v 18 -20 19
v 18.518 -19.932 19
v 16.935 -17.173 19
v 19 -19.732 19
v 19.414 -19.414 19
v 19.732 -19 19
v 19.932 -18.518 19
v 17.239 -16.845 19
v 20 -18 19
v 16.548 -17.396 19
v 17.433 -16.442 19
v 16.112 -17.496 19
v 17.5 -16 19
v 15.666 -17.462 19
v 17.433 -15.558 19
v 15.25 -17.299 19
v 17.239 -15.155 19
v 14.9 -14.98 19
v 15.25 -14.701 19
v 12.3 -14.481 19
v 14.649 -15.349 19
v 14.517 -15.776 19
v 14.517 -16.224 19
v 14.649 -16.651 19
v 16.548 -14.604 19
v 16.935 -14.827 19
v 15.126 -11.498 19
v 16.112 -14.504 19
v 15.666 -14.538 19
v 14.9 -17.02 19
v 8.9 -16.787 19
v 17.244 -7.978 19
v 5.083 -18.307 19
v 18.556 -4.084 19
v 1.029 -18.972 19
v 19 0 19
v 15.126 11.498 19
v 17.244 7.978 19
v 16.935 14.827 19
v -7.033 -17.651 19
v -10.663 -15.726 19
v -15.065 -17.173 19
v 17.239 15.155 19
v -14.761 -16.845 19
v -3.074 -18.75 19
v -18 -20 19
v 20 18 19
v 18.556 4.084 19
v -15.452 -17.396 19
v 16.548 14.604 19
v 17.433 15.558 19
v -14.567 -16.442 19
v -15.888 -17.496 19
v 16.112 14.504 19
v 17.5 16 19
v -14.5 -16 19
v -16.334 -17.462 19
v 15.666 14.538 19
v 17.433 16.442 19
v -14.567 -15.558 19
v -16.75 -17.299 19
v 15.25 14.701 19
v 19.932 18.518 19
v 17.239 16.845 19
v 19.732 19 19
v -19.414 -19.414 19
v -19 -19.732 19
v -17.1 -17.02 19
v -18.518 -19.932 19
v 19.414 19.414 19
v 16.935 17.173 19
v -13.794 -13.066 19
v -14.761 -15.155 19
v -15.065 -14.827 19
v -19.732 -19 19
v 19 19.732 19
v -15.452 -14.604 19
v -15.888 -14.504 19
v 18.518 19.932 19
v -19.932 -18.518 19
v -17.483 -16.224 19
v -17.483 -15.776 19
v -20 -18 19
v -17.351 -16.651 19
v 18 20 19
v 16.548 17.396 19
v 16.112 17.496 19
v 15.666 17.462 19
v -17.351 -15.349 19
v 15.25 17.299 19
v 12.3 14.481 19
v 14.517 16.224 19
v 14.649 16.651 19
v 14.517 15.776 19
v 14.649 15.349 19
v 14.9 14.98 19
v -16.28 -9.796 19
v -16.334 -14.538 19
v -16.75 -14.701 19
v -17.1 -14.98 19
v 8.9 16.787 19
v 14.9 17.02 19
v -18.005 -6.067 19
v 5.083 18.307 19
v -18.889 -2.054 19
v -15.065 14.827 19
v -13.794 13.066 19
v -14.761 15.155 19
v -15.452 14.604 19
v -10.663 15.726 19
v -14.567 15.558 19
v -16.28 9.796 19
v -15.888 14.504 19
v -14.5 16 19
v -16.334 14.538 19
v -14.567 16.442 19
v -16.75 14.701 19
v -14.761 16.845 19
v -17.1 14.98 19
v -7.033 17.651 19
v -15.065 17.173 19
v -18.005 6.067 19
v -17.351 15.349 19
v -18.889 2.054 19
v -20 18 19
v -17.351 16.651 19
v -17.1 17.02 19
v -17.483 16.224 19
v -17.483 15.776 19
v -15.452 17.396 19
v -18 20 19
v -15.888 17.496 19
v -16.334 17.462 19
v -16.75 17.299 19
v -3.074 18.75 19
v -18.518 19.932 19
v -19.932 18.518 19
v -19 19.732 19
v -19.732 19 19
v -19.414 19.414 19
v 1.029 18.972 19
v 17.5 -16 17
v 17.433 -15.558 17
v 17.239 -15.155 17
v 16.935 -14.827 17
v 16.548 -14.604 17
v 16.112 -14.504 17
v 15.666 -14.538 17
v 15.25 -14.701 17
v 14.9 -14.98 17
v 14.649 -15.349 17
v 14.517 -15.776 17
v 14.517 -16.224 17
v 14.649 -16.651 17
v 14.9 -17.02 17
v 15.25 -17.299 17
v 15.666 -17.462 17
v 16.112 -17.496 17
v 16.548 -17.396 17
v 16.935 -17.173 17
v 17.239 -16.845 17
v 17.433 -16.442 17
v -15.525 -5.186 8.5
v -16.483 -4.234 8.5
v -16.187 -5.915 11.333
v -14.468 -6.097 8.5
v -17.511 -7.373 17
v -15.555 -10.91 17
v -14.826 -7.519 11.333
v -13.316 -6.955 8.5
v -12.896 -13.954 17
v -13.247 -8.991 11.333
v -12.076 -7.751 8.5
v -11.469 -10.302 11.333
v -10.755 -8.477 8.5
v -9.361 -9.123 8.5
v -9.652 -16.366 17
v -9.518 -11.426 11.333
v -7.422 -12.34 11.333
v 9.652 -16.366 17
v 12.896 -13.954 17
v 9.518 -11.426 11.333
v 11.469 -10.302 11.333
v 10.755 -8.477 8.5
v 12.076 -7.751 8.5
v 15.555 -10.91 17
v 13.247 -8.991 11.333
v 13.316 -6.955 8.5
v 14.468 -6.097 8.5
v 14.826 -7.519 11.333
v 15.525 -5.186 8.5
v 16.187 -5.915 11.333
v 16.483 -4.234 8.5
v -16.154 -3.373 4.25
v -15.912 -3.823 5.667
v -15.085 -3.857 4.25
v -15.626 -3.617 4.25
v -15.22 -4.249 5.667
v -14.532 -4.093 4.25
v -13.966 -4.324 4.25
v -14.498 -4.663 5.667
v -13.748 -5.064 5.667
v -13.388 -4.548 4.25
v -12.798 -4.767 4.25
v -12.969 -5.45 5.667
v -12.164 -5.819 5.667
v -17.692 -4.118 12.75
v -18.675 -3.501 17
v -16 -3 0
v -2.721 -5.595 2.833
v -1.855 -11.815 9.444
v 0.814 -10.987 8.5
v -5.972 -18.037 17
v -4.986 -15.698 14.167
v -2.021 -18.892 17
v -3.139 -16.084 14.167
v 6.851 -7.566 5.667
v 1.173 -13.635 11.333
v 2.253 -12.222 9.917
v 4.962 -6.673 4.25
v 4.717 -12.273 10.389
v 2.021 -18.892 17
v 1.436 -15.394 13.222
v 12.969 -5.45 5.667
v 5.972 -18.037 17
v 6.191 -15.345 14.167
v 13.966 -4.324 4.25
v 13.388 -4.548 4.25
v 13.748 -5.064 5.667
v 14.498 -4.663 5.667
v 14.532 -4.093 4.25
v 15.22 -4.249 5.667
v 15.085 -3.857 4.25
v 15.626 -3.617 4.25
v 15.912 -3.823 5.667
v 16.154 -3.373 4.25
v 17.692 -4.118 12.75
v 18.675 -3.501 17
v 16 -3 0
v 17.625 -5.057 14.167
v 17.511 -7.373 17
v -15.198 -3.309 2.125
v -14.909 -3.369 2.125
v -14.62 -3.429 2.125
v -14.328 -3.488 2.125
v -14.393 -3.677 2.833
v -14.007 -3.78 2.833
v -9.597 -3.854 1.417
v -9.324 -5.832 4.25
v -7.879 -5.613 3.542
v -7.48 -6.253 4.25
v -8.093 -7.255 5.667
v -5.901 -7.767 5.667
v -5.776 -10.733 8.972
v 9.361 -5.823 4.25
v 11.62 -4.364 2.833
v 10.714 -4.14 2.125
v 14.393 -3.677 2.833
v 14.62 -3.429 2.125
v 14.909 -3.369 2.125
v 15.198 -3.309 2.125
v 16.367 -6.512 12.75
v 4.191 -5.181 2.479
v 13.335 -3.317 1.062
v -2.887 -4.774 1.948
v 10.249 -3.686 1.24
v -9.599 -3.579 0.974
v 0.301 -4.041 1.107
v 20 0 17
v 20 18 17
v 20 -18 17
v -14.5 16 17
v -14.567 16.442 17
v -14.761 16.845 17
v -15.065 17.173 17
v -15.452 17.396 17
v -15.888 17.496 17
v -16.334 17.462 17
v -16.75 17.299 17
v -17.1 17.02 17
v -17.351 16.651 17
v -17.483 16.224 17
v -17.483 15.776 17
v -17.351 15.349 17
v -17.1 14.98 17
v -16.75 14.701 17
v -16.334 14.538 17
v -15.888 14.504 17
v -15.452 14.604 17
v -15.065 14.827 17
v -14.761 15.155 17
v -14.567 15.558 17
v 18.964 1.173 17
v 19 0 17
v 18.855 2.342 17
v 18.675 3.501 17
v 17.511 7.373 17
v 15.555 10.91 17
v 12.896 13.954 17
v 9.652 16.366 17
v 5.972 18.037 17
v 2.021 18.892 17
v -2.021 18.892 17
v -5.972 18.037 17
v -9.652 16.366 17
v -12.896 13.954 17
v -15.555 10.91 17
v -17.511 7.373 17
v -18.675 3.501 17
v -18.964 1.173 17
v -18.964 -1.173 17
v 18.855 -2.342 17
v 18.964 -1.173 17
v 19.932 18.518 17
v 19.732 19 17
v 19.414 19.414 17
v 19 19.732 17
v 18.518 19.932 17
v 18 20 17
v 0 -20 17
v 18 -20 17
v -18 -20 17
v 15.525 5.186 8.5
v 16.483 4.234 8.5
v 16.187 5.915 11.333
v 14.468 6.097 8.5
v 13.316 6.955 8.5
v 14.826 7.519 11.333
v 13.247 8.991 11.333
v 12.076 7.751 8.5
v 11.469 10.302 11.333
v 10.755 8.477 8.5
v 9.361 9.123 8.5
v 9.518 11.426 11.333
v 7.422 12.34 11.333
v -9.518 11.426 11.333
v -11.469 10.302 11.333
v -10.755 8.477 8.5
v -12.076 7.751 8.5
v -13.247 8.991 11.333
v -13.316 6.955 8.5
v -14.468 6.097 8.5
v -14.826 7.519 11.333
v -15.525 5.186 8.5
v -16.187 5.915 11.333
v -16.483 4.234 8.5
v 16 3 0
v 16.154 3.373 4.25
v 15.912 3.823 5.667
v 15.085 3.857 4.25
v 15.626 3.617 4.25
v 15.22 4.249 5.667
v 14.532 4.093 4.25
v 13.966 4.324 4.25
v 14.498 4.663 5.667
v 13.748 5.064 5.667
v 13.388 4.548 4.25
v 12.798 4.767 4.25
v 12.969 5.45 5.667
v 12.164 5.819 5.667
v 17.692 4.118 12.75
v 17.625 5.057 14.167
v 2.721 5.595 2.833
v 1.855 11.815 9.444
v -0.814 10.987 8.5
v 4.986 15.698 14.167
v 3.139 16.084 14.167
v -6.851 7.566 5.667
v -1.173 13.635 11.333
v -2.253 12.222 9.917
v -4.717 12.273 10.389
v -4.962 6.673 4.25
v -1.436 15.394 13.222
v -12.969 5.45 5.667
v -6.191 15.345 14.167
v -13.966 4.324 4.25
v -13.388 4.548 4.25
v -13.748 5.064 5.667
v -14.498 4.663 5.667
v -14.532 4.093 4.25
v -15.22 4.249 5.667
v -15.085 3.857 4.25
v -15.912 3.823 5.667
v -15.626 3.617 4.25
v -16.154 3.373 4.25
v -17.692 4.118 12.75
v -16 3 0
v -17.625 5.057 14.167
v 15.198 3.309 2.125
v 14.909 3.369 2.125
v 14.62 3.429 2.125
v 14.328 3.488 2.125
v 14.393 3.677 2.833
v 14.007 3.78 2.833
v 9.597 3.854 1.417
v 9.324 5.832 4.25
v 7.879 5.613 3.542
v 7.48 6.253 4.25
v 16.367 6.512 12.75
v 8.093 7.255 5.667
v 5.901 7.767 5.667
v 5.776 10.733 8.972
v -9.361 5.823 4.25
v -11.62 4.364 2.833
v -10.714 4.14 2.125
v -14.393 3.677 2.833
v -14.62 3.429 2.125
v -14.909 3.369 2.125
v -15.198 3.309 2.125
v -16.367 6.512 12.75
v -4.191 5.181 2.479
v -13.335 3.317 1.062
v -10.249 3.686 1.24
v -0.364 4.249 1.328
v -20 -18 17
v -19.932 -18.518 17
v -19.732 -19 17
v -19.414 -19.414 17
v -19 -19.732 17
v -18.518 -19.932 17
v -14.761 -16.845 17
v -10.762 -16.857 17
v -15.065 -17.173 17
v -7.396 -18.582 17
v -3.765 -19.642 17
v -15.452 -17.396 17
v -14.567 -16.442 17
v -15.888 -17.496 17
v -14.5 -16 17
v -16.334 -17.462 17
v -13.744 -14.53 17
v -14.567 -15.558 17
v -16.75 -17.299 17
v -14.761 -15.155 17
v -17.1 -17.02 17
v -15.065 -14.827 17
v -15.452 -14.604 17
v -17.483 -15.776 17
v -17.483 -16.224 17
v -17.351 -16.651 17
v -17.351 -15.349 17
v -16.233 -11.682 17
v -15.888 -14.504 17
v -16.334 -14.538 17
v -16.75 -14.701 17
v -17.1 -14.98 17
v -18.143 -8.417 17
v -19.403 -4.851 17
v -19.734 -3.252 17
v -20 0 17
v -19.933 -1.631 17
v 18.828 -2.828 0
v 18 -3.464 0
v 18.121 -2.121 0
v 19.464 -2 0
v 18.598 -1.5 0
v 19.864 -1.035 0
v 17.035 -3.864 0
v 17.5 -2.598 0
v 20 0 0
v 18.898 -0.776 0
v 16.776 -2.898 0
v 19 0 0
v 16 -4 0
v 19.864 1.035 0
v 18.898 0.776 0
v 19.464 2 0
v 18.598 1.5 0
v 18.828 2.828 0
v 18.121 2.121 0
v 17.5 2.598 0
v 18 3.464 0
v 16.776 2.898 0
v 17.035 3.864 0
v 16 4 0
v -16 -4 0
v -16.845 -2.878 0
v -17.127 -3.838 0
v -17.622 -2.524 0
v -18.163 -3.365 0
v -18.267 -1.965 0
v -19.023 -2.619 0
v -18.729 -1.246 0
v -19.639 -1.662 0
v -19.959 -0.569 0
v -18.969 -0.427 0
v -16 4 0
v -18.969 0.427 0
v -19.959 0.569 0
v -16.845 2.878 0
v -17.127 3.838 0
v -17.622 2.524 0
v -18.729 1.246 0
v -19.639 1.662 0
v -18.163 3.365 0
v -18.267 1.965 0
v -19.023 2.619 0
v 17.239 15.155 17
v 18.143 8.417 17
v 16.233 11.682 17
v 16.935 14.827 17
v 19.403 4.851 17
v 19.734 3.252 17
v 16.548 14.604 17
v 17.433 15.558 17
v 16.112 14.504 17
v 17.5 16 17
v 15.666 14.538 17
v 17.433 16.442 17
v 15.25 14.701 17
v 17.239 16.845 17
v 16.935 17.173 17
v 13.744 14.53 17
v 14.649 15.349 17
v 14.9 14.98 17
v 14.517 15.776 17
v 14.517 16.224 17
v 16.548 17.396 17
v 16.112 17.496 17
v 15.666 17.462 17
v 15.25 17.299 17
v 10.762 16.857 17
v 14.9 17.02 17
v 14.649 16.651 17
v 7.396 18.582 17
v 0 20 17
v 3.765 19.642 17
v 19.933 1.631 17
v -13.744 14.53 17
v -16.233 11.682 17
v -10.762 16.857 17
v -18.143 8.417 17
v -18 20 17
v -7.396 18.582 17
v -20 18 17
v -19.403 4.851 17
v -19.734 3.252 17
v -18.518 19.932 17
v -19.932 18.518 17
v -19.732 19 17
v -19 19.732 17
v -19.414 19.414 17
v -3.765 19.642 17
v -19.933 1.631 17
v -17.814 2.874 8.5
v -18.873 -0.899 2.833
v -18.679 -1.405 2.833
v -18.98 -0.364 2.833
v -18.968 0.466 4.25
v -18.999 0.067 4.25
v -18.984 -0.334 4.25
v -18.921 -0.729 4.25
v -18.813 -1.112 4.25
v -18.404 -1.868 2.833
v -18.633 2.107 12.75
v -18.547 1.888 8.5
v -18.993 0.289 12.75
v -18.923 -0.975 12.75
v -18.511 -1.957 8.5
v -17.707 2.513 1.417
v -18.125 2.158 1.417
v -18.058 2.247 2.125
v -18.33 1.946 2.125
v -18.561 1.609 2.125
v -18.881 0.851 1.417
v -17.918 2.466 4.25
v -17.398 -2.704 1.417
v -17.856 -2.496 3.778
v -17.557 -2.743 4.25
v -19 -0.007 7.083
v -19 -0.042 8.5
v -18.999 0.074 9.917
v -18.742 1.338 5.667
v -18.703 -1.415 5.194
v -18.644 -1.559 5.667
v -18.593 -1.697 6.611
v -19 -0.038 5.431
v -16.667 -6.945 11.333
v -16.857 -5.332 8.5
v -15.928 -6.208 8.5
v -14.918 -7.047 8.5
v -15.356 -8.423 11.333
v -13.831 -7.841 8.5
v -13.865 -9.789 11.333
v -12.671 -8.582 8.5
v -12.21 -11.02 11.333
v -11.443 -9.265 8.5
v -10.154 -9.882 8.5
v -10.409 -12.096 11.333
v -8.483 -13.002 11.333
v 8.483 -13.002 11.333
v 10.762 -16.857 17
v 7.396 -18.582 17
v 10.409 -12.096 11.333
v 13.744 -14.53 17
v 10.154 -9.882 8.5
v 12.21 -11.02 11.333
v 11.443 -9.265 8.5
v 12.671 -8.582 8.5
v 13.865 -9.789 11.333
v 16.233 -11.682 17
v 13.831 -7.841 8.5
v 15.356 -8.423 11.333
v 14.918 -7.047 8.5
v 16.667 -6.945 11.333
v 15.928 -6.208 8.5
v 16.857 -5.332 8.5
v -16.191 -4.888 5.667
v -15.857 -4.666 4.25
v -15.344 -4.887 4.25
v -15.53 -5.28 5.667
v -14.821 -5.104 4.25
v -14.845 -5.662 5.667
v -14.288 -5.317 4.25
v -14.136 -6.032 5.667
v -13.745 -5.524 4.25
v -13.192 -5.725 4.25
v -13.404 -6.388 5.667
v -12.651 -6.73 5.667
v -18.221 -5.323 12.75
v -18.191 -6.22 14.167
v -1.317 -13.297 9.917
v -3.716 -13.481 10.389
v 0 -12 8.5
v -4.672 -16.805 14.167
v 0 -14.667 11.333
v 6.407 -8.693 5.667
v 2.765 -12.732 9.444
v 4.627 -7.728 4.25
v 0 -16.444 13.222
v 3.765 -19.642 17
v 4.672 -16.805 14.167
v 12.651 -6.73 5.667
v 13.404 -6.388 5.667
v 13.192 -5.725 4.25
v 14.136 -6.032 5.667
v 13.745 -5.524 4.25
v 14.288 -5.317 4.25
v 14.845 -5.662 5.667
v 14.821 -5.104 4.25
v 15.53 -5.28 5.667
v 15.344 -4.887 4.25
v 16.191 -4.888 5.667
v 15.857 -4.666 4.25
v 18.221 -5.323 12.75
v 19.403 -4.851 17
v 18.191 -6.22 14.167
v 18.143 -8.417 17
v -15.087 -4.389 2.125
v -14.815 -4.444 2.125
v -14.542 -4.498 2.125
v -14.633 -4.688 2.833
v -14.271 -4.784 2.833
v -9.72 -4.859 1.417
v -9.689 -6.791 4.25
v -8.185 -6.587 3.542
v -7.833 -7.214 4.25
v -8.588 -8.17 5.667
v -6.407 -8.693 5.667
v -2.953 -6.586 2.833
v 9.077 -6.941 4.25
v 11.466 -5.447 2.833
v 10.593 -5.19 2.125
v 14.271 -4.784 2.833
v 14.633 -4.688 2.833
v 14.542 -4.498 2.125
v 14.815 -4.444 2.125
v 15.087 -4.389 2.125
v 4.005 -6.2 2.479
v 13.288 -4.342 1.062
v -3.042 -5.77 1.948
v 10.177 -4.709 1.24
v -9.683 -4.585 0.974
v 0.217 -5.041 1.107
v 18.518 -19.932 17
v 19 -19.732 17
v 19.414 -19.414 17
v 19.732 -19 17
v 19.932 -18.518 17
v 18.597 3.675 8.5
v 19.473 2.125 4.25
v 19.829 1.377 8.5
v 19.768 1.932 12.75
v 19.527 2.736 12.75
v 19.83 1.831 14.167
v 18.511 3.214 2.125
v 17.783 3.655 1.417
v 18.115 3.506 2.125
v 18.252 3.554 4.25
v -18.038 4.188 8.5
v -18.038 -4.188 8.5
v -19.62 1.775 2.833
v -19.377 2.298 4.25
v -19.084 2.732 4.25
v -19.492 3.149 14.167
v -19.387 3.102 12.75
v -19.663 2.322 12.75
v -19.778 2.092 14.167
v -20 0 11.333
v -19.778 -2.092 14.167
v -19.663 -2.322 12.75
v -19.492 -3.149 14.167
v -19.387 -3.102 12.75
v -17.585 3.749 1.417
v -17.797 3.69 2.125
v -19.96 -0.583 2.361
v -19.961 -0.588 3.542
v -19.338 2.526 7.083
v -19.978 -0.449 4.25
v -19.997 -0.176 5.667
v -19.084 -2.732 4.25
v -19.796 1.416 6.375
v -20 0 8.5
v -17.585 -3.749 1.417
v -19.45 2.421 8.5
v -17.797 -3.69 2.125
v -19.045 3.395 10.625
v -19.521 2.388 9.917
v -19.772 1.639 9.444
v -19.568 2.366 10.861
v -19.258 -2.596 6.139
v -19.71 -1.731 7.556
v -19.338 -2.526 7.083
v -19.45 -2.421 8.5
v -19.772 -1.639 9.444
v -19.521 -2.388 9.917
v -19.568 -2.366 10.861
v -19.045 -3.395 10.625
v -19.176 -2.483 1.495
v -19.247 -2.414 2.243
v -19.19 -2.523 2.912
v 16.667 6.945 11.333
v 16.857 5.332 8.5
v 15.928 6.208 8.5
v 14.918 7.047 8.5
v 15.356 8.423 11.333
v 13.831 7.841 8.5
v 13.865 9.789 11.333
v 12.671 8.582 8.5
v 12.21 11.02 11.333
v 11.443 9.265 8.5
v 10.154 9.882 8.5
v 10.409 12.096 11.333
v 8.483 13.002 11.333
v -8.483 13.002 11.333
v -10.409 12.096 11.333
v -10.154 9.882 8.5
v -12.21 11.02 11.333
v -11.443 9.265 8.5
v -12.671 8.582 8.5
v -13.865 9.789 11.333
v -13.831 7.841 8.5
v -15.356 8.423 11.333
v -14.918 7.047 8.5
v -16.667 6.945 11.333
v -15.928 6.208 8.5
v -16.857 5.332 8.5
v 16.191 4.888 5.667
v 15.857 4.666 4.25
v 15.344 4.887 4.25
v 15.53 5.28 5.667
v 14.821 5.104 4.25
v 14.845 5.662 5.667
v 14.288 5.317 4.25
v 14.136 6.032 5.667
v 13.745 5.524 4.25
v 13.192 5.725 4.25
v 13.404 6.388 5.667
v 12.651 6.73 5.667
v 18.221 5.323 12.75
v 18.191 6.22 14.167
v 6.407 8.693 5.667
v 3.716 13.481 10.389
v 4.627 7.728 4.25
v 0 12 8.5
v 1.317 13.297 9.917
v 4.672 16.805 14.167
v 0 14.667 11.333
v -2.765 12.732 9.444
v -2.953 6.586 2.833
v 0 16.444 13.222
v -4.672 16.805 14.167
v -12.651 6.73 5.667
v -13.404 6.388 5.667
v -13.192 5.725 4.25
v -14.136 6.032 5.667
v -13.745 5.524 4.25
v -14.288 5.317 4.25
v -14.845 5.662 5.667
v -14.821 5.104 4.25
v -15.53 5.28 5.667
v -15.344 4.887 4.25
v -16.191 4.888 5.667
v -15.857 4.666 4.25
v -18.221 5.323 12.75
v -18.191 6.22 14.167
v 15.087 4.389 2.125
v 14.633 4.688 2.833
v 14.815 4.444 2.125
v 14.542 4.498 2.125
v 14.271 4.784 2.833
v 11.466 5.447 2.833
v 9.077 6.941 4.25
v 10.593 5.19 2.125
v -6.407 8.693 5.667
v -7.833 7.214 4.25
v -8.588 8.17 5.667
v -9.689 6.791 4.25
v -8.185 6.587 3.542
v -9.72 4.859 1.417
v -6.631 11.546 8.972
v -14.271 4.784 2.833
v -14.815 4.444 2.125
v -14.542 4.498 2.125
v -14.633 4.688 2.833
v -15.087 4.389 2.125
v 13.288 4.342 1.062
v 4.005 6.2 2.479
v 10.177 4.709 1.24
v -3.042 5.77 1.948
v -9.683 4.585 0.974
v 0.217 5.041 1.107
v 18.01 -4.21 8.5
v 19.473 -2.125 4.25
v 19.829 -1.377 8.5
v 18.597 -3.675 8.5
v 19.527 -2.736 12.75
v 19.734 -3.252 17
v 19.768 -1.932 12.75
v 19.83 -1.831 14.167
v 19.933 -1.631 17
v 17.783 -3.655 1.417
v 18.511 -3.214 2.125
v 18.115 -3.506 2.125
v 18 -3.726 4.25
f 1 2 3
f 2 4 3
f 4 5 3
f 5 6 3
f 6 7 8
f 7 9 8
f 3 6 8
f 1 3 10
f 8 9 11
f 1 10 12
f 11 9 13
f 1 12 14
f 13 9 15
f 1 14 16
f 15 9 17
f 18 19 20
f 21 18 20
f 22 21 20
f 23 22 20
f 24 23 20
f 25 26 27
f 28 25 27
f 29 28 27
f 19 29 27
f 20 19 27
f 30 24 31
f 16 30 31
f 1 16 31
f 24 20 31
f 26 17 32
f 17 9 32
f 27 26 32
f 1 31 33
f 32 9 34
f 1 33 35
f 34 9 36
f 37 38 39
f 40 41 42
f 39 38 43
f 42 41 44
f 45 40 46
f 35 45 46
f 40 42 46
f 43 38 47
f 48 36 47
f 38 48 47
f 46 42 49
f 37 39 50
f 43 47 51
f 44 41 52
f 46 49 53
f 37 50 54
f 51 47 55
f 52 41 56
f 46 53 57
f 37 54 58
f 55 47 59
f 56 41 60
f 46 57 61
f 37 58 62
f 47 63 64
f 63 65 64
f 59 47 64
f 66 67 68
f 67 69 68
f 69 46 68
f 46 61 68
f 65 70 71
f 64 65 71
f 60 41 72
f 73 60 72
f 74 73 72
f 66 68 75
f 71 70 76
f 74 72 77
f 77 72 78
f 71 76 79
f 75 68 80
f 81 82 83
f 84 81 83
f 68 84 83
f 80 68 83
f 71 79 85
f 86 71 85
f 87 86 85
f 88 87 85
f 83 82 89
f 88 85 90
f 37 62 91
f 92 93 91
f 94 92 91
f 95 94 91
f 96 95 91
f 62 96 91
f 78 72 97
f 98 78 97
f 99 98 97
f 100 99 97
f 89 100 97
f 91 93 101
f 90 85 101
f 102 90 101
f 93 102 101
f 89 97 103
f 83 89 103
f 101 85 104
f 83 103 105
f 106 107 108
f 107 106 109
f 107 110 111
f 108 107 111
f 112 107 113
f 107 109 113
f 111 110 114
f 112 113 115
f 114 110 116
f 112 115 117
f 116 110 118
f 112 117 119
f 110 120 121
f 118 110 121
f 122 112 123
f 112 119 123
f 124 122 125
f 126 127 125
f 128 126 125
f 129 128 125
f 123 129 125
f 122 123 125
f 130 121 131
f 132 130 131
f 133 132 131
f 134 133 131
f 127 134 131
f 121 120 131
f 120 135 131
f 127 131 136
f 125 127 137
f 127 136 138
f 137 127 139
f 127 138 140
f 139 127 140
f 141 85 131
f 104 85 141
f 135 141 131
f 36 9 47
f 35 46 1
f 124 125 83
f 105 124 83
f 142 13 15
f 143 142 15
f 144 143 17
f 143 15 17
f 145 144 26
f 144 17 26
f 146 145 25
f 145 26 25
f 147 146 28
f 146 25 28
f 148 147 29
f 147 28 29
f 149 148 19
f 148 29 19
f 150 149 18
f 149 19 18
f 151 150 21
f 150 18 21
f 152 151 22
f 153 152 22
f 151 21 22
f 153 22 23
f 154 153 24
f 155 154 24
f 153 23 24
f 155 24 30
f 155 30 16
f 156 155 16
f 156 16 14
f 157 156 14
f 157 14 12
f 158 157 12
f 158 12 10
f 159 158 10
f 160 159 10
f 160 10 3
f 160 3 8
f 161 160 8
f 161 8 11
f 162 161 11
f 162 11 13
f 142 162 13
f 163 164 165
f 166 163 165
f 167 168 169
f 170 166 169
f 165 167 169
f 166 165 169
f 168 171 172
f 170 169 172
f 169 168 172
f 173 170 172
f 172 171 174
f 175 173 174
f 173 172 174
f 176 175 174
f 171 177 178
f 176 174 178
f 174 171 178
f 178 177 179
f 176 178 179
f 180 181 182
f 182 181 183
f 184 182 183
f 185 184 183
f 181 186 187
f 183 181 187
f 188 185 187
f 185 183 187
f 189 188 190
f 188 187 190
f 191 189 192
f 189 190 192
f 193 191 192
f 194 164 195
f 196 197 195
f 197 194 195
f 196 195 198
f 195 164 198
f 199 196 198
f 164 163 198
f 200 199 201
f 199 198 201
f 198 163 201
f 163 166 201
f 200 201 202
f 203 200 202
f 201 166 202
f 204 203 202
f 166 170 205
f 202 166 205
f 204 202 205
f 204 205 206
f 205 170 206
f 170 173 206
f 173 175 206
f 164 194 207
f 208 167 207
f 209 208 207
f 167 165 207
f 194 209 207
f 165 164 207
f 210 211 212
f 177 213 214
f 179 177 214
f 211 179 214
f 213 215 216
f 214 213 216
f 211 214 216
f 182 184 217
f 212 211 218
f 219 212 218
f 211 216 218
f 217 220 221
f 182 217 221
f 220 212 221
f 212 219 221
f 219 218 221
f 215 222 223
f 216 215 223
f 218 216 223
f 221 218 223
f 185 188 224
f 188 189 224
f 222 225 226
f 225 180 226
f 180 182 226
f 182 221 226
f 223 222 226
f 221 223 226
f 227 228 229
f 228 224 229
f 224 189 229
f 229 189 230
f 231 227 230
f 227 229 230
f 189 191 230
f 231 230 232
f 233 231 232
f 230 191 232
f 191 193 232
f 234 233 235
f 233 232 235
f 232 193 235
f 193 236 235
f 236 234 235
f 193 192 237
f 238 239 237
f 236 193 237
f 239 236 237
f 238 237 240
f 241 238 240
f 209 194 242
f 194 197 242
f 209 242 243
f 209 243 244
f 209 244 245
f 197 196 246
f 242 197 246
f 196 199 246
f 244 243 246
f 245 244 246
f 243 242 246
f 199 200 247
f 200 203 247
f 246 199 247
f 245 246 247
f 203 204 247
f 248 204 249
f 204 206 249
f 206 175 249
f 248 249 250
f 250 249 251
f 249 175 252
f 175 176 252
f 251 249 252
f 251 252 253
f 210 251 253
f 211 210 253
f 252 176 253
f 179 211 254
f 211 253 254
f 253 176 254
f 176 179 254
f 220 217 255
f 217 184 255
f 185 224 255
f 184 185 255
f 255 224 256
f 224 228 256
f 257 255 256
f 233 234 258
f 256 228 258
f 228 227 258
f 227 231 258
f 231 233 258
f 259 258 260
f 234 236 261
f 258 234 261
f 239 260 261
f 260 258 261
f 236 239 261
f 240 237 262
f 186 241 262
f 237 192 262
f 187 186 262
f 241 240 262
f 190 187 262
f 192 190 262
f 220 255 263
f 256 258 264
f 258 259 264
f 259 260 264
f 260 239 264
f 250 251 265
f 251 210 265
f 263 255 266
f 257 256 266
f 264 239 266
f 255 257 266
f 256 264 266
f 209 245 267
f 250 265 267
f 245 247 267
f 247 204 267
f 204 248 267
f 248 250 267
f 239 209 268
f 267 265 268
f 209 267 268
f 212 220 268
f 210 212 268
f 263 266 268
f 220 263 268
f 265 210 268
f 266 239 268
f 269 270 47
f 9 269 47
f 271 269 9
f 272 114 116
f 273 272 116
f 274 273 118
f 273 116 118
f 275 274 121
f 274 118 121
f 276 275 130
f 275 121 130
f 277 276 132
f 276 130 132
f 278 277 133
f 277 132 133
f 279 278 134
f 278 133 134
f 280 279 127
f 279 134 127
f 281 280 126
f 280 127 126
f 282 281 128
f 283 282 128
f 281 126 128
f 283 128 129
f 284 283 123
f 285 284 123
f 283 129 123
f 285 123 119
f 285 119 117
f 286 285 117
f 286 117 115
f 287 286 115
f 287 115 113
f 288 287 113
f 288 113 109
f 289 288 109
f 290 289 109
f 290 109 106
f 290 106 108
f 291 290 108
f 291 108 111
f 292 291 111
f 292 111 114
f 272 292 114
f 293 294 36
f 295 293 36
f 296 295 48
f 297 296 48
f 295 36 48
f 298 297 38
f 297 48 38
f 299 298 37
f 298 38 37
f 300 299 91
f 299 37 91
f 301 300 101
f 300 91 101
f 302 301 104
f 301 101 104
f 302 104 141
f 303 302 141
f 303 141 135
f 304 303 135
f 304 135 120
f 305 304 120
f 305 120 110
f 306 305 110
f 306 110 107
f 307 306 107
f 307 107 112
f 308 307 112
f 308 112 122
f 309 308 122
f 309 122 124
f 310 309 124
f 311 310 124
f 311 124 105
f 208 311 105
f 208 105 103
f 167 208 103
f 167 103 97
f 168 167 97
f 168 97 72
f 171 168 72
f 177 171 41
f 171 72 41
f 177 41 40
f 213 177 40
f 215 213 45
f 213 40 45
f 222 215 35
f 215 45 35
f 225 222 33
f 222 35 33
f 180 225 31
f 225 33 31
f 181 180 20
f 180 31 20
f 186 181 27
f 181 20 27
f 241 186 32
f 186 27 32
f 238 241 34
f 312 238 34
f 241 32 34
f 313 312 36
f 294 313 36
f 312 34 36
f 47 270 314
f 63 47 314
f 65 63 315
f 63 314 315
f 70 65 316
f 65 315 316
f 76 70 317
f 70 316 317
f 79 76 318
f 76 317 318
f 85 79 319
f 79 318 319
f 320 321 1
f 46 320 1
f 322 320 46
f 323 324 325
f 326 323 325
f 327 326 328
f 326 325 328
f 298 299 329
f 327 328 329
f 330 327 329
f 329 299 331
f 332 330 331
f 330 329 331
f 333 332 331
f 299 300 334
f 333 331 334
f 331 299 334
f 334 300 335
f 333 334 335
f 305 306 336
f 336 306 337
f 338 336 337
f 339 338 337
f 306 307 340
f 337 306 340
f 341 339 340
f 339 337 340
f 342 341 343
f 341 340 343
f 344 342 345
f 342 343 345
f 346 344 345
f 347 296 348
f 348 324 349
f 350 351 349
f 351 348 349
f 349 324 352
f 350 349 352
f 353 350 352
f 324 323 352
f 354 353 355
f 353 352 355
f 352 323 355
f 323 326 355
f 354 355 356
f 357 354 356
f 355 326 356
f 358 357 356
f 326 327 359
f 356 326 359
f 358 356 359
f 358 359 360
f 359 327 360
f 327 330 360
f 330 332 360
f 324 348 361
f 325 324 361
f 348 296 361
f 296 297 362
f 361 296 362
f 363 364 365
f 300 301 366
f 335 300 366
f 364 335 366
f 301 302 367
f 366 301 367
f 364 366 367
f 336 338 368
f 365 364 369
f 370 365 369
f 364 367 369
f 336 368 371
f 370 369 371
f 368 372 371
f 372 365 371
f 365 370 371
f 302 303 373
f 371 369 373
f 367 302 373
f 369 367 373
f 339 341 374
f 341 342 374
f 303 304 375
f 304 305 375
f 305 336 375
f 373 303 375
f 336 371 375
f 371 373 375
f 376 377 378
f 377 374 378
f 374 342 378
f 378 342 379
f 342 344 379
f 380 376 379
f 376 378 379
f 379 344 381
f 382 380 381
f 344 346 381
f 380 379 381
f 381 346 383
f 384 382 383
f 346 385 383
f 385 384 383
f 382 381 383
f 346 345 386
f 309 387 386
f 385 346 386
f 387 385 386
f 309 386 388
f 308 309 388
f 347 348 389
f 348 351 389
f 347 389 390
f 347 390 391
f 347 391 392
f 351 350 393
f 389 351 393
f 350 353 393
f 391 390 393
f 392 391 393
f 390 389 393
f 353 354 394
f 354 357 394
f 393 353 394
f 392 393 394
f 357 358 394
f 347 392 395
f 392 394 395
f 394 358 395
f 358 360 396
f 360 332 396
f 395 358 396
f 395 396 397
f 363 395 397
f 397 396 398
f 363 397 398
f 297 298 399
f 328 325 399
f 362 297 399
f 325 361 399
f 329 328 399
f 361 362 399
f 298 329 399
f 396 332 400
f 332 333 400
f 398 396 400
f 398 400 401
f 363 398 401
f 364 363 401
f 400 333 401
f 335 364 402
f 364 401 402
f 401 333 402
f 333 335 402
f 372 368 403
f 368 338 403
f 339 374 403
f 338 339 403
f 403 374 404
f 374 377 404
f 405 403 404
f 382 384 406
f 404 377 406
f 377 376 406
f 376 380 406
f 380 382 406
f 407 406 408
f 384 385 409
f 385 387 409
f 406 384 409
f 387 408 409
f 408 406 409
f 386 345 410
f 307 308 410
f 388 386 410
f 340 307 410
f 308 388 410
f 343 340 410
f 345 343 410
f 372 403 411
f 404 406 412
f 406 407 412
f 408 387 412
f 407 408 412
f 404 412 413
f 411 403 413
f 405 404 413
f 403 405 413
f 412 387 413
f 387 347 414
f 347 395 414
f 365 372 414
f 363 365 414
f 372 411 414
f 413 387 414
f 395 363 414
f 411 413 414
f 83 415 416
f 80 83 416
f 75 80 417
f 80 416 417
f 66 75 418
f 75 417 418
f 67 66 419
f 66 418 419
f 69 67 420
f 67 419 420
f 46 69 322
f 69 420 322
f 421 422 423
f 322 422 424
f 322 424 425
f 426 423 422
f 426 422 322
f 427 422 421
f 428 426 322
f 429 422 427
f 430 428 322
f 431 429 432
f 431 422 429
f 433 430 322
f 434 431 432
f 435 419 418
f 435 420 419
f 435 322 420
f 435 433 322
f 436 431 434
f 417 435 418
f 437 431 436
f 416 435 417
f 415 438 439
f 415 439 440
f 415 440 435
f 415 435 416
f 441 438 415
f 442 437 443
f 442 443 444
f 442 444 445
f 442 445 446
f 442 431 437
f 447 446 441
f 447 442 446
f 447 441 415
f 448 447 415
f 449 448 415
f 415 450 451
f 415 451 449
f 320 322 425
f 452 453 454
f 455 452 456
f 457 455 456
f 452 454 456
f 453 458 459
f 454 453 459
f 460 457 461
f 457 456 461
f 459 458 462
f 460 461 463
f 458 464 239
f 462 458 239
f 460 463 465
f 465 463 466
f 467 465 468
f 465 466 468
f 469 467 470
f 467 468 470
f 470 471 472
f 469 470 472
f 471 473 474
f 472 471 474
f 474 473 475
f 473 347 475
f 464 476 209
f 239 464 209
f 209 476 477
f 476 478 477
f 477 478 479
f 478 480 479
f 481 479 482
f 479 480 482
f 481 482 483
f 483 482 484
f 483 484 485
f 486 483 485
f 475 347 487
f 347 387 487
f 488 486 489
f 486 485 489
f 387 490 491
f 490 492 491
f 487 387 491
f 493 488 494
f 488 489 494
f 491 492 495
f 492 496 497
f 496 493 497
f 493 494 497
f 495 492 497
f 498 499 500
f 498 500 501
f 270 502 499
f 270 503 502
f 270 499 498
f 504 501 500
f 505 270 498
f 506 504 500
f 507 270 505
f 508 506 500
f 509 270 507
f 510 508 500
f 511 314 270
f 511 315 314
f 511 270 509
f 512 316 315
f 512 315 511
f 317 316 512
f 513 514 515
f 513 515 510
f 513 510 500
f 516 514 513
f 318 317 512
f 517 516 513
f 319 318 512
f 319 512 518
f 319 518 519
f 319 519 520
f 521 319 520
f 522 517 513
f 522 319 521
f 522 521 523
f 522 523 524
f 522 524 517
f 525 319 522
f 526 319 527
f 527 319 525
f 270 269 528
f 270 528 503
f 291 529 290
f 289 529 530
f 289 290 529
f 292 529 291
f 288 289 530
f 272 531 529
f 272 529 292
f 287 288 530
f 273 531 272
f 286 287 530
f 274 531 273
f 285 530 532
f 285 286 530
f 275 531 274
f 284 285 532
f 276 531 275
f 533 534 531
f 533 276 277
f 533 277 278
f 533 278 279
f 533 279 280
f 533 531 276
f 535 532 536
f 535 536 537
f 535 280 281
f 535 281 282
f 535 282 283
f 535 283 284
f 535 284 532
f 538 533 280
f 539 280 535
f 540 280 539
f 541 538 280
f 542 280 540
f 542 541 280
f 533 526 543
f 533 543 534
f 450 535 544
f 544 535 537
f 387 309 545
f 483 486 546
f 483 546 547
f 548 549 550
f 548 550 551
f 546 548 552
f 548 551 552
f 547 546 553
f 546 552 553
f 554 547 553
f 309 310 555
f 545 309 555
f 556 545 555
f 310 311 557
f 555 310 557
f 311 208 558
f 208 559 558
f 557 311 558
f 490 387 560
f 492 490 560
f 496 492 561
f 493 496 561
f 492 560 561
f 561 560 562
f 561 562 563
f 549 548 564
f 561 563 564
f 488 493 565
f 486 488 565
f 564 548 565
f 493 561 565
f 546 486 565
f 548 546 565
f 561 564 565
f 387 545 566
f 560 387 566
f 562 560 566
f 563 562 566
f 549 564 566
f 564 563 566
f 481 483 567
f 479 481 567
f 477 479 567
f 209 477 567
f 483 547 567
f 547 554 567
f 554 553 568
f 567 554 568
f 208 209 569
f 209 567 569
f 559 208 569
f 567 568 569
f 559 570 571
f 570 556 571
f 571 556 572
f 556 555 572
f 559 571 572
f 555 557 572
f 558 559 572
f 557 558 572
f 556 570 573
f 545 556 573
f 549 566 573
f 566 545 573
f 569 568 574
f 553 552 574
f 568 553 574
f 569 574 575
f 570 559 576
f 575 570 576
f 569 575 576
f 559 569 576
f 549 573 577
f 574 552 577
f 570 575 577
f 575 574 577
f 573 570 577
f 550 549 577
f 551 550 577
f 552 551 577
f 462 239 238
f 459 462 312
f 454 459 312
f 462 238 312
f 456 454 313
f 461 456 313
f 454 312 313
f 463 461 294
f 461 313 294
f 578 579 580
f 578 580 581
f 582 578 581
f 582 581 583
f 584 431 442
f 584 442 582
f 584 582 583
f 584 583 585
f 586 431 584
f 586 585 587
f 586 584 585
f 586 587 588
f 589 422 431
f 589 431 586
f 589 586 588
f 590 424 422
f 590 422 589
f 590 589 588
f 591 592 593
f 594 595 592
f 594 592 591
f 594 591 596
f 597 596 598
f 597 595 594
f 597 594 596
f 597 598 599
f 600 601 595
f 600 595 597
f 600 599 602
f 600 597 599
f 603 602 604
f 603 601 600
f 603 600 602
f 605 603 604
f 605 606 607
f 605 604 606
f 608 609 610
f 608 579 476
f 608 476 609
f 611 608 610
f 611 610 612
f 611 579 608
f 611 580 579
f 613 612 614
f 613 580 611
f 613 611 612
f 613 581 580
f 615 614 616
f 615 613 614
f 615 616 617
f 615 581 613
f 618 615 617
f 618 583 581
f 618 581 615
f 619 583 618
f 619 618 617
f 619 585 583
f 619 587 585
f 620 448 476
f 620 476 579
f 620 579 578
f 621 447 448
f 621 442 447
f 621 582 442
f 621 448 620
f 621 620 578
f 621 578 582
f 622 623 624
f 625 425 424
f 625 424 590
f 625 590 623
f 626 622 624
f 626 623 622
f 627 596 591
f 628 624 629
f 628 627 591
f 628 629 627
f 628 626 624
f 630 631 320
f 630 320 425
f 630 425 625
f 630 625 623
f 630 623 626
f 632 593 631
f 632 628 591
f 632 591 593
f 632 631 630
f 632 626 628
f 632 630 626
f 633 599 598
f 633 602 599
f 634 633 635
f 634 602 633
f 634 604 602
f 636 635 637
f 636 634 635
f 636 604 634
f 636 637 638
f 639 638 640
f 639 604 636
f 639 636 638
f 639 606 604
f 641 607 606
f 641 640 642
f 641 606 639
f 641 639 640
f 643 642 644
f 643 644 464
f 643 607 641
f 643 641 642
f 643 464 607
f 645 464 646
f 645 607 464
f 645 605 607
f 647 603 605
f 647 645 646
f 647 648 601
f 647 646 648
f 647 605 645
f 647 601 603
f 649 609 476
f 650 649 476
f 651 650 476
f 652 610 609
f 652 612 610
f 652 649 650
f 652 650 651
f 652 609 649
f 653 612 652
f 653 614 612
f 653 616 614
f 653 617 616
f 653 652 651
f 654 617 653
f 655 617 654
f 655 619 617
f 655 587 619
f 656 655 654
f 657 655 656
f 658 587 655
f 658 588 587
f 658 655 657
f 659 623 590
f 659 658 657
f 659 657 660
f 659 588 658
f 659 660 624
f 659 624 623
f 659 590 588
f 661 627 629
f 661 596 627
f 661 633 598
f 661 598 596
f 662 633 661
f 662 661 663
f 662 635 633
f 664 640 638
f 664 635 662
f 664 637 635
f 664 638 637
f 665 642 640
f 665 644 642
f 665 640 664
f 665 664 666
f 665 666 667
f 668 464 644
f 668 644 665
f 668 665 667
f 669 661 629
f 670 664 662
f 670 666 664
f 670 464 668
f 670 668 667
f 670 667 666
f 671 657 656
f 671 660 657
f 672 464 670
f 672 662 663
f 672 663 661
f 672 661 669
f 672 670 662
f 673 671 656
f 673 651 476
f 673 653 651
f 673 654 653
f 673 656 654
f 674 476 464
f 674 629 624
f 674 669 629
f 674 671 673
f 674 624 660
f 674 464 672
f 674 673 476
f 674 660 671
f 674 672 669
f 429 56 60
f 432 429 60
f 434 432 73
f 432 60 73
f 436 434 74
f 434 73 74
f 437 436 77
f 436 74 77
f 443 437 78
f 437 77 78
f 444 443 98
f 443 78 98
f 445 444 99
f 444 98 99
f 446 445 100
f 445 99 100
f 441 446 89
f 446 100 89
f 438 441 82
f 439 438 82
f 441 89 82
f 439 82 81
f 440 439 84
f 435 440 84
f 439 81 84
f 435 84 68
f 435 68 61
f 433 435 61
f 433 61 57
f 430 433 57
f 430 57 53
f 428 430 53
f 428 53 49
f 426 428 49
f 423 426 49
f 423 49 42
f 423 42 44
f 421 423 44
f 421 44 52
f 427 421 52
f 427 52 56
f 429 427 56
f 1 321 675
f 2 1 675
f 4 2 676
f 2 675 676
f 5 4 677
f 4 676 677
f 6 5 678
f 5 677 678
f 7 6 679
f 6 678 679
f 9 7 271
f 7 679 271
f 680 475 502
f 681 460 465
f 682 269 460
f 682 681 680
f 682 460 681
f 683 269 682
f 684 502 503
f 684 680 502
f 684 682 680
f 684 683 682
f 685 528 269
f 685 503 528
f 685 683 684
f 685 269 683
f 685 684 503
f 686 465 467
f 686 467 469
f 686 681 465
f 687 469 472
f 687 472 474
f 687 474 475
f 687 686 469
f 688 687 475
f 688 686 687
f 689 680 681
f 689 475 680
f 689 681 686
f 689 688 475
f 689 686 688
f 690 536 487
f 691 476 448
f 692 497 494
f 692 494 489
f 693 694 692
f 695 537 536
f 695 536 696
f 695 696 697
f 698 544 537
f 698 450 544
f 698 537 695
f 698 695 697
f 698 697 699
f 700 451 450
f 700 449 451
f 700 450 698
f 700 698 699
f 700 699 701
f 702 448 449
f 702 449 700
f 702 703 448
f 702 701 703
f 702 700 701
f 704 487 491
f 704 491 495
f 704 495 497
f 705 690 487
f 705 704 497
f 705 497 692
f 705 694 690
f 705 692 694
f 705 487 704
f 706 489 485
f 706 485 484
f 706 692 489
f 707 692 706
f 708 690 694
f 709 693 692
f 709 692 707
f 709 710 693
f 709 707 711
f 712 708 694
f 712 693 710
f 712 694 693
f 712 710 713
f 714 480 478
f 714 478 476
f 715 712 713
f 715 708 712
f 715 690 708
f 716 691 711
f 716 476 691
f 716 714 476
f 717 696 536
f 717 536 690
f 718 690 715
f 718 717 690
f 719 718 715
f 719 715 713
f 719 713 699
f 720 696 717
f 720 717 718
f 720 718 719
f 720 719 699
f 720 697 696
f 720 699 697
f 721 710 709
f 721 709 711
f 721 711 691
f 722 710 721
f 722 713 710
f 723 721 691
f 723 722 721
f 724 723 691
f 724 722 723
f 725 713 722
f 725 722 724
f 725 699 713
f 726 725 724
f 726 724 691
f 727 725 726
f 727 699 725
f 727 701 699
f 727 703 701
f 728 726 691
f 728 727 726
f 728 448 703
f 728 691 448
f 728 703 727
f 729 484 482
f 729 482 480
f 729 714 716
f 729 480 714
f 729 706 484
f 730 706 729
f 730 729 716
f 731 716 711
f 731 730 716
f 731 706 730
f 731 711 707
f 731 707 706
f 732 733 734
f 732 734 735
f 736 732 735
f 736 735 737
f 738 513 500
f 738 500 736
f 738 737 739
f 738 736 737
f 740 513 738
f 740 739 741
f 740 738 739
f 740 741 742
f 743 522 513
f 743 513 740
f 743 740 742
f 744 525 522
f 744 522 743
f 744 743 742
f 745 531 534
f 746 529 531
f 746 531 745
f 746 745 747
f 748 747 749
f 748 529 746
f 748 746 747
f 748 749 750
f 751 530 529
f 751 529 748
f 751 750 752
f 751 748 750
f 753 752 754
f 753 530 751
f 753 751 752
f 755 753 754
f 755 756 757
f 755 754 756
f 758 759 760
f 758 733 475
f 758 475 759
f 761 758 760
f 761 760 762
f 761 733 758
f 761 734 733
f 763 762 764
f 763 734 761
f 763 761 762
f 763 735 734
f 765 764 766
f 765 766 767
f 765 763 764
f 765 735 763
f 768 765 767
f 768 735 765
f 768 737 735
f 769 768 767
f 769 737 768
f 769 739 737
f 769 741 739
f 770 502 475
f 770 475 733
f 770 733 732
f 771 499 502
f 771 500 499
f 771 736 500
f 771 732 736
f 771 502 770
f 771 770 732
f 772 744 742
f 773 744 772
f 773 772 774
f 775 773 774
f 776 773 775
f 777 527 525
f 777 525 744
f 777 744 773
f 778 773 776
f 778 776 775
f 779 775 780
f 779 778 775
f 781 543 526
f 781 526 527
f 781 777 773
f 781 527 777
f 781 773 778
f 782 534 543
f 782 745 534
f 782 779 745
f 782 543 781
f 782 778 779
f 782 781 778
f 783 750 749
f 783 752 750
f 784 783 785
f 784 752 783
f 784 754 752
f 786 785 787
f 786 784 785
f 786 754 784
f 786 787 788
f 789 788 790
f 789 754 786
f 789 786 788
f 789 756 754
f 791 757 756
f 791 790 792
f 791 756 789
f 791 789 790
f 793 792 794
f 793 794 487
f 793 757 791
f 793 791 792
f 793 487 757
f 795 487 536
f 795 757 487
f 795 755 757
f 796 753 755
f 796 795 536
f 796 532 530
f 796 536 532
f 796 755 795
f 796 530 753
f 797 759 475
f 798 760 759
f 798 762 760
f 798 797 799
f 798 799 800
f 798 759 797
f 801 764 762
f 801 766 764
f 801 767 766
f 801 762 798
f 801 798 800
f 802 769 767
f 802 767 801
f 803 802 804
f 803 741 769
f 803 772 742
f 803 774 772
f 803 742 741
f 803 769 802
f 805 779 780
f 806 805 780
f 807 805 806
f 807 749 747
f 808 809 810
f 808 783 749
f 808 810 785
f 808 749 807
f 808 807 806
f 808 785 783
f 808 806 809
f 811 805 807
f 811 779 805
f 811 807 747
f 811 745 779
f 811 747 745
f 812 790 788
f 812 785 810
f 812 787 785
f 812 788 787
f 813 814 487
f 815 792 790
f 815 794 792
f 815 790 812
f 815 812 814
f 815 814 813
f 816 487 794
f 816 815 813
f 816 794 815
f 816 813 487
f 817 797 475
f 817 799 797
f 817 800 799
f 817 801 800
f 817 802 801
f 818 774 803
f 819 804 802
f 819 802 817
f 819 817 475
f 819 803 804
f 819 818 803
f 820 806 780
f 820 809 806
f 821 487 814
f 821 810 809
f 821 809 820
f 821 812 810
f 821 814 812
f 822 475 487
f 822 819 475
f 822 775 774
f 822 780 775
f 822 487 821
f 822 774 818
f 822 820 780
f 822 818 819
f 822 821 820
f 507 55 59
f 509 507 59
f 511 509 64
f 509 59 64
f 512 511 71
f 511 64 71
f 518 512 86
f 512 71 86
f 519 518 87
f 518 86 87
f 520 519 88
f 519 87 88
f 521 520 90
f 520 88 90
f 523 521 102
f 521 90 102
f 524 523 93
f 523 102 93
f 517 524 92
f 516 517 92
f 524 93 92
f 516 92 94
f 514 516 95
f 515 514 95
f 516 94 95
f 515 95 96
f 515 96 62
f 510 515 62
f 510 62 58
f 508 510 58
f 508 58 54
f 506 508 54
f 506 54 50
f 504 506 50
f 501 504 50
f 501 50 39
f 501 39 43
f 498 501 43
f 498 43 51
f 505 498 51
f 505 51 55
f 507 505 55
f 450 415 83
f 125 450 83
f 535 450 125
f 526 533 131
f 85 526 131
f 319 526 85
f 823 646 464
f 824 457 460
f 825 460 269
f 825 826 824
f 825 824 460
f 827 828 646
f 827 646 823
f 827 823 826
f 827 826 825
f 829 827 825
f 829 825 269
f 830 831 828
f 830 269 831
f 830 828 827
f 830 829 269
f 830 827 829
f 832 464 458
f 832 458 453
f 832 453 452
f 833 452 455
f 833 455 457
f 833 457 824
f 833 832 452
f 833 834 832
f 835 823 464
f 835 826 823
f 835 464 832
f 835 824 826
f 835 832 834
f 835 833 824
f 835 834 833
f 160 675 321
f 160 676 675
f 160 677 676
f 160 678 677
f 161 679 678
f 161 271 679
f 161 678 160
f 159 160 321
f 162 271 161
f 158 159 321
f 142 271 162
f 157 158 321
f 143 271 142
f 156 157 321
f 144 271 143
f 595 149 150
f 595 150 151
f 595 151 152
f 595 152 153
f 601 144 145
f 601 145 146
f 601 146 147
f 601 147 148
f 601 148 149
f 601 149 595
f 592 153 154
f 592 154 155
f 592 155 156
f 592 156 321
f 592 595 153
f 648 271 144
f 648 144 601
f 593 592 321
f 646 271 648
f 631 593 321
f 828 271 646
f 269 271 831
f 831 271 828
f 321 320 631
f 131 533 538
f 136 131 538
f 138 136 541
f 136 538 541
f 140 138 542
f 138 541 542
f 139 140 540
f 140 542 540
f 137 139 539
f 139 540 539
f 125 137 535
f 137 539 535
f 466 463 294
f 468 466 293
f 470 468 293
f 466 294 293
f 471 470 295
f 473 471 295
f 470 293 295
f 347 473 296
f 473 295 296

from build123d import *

# Parameters (mm, degrees)
SKETCH002_R     = 19
SKETCH003_R     = 20
PAD_DEPTH       = 2
SKETCH005_R     = 19
POCKET_DEPTH    = 2
SKETCH006_R     = 1.5
POCKET001_DEPTH = 5


with BuildPart() as loft_body:
    # Sketch → Loft section 0
    with BuildSketch(Plane.XY):
        with BuildLine():
            ThreePointArc((-16, 3), (-19, 0), (-16, -3))
            Line((-16, -3), (16, -3))
            ThreePointArc((16, -3), (19, 0), (16, 3))
            Line((-16, 3), (16, 3))
        make_face()
    # Sketch002 → Loft section 1
    with BuildSketch(Plane.XY.offset(17)):
        Circle(SKETCH002_R)
    loft()


with BuildPart() as pocket001:
    # Sketch001 → Loft001 section 0
    with BuildSketch(Plane.XY):
        with BuildLine():
            ThreePointArc((-16, 4), (-20, 0), (-16, -4))
            Line((-16, -4), (16, -4))
            ThreePointArc((16, -4), (20, 0), (16, 4))
            Line((-16, 4), (16, 4))
        make_face()
    # Sketch003 → Loft001 section 1
    with BuildSketch(Plane.XY.offset(17)):
        Circle(SKETCH003_R)
    loft()

    # Cut: cut Loft body
    add(loft_body.part, mode=Mode.SUBTRACT)

    # Sketch004 → Pad (new body)
    with BuildSketch(Plane.XY.offset(17)):
        with BuildLine():
            Line((-18, 20), (18, 20))
            ThreePointArc((20, 18), (19.414214, 19.414214), (18, 20))
            Line((20, 18), (20, -18))
            ThreePointArc((18, -20), (19.414214, -19.414214), (20, -18))
            Line((18, -20), (-18, -20))
            ThreePointArc((-20, -18), (-19.414214, -19.414214), (-18, -20))
            Line((-20, -18), (-20, 18))
            ThreePointArc((-18, 20), (-19.414214, 19.414214), (-20, 18))
        make_face()
    extrude(amount=PAD_DEPTH)

    # Sketch005 → Pocket (cut)
    with BuildSketch(Plane.XY.offset(19)):
        Circle(SKETCH005_R)
    extrude(amount=-POCKET_DEPTH, mode=Mode.SUBTRACT)

    # Sketch006 → Pocket001 (cut)
    with BuildSketch(Plane.XY.offset(19)):
        with Locations((-16, 16)):
            Circle(SKETCH006_R)
        with Locations((16, 16)):
            Circle(SKETCH006_R)
        with Locations((-16, -16)):
            Circle(SKETCH006_R)
        with Locations((16, -16)):
            Circle(SKETCH006_R)
    extrude(amount=-POCKET001_DEPTH, mode=Mode.SUBTRACT)


solid = pocket001.part
